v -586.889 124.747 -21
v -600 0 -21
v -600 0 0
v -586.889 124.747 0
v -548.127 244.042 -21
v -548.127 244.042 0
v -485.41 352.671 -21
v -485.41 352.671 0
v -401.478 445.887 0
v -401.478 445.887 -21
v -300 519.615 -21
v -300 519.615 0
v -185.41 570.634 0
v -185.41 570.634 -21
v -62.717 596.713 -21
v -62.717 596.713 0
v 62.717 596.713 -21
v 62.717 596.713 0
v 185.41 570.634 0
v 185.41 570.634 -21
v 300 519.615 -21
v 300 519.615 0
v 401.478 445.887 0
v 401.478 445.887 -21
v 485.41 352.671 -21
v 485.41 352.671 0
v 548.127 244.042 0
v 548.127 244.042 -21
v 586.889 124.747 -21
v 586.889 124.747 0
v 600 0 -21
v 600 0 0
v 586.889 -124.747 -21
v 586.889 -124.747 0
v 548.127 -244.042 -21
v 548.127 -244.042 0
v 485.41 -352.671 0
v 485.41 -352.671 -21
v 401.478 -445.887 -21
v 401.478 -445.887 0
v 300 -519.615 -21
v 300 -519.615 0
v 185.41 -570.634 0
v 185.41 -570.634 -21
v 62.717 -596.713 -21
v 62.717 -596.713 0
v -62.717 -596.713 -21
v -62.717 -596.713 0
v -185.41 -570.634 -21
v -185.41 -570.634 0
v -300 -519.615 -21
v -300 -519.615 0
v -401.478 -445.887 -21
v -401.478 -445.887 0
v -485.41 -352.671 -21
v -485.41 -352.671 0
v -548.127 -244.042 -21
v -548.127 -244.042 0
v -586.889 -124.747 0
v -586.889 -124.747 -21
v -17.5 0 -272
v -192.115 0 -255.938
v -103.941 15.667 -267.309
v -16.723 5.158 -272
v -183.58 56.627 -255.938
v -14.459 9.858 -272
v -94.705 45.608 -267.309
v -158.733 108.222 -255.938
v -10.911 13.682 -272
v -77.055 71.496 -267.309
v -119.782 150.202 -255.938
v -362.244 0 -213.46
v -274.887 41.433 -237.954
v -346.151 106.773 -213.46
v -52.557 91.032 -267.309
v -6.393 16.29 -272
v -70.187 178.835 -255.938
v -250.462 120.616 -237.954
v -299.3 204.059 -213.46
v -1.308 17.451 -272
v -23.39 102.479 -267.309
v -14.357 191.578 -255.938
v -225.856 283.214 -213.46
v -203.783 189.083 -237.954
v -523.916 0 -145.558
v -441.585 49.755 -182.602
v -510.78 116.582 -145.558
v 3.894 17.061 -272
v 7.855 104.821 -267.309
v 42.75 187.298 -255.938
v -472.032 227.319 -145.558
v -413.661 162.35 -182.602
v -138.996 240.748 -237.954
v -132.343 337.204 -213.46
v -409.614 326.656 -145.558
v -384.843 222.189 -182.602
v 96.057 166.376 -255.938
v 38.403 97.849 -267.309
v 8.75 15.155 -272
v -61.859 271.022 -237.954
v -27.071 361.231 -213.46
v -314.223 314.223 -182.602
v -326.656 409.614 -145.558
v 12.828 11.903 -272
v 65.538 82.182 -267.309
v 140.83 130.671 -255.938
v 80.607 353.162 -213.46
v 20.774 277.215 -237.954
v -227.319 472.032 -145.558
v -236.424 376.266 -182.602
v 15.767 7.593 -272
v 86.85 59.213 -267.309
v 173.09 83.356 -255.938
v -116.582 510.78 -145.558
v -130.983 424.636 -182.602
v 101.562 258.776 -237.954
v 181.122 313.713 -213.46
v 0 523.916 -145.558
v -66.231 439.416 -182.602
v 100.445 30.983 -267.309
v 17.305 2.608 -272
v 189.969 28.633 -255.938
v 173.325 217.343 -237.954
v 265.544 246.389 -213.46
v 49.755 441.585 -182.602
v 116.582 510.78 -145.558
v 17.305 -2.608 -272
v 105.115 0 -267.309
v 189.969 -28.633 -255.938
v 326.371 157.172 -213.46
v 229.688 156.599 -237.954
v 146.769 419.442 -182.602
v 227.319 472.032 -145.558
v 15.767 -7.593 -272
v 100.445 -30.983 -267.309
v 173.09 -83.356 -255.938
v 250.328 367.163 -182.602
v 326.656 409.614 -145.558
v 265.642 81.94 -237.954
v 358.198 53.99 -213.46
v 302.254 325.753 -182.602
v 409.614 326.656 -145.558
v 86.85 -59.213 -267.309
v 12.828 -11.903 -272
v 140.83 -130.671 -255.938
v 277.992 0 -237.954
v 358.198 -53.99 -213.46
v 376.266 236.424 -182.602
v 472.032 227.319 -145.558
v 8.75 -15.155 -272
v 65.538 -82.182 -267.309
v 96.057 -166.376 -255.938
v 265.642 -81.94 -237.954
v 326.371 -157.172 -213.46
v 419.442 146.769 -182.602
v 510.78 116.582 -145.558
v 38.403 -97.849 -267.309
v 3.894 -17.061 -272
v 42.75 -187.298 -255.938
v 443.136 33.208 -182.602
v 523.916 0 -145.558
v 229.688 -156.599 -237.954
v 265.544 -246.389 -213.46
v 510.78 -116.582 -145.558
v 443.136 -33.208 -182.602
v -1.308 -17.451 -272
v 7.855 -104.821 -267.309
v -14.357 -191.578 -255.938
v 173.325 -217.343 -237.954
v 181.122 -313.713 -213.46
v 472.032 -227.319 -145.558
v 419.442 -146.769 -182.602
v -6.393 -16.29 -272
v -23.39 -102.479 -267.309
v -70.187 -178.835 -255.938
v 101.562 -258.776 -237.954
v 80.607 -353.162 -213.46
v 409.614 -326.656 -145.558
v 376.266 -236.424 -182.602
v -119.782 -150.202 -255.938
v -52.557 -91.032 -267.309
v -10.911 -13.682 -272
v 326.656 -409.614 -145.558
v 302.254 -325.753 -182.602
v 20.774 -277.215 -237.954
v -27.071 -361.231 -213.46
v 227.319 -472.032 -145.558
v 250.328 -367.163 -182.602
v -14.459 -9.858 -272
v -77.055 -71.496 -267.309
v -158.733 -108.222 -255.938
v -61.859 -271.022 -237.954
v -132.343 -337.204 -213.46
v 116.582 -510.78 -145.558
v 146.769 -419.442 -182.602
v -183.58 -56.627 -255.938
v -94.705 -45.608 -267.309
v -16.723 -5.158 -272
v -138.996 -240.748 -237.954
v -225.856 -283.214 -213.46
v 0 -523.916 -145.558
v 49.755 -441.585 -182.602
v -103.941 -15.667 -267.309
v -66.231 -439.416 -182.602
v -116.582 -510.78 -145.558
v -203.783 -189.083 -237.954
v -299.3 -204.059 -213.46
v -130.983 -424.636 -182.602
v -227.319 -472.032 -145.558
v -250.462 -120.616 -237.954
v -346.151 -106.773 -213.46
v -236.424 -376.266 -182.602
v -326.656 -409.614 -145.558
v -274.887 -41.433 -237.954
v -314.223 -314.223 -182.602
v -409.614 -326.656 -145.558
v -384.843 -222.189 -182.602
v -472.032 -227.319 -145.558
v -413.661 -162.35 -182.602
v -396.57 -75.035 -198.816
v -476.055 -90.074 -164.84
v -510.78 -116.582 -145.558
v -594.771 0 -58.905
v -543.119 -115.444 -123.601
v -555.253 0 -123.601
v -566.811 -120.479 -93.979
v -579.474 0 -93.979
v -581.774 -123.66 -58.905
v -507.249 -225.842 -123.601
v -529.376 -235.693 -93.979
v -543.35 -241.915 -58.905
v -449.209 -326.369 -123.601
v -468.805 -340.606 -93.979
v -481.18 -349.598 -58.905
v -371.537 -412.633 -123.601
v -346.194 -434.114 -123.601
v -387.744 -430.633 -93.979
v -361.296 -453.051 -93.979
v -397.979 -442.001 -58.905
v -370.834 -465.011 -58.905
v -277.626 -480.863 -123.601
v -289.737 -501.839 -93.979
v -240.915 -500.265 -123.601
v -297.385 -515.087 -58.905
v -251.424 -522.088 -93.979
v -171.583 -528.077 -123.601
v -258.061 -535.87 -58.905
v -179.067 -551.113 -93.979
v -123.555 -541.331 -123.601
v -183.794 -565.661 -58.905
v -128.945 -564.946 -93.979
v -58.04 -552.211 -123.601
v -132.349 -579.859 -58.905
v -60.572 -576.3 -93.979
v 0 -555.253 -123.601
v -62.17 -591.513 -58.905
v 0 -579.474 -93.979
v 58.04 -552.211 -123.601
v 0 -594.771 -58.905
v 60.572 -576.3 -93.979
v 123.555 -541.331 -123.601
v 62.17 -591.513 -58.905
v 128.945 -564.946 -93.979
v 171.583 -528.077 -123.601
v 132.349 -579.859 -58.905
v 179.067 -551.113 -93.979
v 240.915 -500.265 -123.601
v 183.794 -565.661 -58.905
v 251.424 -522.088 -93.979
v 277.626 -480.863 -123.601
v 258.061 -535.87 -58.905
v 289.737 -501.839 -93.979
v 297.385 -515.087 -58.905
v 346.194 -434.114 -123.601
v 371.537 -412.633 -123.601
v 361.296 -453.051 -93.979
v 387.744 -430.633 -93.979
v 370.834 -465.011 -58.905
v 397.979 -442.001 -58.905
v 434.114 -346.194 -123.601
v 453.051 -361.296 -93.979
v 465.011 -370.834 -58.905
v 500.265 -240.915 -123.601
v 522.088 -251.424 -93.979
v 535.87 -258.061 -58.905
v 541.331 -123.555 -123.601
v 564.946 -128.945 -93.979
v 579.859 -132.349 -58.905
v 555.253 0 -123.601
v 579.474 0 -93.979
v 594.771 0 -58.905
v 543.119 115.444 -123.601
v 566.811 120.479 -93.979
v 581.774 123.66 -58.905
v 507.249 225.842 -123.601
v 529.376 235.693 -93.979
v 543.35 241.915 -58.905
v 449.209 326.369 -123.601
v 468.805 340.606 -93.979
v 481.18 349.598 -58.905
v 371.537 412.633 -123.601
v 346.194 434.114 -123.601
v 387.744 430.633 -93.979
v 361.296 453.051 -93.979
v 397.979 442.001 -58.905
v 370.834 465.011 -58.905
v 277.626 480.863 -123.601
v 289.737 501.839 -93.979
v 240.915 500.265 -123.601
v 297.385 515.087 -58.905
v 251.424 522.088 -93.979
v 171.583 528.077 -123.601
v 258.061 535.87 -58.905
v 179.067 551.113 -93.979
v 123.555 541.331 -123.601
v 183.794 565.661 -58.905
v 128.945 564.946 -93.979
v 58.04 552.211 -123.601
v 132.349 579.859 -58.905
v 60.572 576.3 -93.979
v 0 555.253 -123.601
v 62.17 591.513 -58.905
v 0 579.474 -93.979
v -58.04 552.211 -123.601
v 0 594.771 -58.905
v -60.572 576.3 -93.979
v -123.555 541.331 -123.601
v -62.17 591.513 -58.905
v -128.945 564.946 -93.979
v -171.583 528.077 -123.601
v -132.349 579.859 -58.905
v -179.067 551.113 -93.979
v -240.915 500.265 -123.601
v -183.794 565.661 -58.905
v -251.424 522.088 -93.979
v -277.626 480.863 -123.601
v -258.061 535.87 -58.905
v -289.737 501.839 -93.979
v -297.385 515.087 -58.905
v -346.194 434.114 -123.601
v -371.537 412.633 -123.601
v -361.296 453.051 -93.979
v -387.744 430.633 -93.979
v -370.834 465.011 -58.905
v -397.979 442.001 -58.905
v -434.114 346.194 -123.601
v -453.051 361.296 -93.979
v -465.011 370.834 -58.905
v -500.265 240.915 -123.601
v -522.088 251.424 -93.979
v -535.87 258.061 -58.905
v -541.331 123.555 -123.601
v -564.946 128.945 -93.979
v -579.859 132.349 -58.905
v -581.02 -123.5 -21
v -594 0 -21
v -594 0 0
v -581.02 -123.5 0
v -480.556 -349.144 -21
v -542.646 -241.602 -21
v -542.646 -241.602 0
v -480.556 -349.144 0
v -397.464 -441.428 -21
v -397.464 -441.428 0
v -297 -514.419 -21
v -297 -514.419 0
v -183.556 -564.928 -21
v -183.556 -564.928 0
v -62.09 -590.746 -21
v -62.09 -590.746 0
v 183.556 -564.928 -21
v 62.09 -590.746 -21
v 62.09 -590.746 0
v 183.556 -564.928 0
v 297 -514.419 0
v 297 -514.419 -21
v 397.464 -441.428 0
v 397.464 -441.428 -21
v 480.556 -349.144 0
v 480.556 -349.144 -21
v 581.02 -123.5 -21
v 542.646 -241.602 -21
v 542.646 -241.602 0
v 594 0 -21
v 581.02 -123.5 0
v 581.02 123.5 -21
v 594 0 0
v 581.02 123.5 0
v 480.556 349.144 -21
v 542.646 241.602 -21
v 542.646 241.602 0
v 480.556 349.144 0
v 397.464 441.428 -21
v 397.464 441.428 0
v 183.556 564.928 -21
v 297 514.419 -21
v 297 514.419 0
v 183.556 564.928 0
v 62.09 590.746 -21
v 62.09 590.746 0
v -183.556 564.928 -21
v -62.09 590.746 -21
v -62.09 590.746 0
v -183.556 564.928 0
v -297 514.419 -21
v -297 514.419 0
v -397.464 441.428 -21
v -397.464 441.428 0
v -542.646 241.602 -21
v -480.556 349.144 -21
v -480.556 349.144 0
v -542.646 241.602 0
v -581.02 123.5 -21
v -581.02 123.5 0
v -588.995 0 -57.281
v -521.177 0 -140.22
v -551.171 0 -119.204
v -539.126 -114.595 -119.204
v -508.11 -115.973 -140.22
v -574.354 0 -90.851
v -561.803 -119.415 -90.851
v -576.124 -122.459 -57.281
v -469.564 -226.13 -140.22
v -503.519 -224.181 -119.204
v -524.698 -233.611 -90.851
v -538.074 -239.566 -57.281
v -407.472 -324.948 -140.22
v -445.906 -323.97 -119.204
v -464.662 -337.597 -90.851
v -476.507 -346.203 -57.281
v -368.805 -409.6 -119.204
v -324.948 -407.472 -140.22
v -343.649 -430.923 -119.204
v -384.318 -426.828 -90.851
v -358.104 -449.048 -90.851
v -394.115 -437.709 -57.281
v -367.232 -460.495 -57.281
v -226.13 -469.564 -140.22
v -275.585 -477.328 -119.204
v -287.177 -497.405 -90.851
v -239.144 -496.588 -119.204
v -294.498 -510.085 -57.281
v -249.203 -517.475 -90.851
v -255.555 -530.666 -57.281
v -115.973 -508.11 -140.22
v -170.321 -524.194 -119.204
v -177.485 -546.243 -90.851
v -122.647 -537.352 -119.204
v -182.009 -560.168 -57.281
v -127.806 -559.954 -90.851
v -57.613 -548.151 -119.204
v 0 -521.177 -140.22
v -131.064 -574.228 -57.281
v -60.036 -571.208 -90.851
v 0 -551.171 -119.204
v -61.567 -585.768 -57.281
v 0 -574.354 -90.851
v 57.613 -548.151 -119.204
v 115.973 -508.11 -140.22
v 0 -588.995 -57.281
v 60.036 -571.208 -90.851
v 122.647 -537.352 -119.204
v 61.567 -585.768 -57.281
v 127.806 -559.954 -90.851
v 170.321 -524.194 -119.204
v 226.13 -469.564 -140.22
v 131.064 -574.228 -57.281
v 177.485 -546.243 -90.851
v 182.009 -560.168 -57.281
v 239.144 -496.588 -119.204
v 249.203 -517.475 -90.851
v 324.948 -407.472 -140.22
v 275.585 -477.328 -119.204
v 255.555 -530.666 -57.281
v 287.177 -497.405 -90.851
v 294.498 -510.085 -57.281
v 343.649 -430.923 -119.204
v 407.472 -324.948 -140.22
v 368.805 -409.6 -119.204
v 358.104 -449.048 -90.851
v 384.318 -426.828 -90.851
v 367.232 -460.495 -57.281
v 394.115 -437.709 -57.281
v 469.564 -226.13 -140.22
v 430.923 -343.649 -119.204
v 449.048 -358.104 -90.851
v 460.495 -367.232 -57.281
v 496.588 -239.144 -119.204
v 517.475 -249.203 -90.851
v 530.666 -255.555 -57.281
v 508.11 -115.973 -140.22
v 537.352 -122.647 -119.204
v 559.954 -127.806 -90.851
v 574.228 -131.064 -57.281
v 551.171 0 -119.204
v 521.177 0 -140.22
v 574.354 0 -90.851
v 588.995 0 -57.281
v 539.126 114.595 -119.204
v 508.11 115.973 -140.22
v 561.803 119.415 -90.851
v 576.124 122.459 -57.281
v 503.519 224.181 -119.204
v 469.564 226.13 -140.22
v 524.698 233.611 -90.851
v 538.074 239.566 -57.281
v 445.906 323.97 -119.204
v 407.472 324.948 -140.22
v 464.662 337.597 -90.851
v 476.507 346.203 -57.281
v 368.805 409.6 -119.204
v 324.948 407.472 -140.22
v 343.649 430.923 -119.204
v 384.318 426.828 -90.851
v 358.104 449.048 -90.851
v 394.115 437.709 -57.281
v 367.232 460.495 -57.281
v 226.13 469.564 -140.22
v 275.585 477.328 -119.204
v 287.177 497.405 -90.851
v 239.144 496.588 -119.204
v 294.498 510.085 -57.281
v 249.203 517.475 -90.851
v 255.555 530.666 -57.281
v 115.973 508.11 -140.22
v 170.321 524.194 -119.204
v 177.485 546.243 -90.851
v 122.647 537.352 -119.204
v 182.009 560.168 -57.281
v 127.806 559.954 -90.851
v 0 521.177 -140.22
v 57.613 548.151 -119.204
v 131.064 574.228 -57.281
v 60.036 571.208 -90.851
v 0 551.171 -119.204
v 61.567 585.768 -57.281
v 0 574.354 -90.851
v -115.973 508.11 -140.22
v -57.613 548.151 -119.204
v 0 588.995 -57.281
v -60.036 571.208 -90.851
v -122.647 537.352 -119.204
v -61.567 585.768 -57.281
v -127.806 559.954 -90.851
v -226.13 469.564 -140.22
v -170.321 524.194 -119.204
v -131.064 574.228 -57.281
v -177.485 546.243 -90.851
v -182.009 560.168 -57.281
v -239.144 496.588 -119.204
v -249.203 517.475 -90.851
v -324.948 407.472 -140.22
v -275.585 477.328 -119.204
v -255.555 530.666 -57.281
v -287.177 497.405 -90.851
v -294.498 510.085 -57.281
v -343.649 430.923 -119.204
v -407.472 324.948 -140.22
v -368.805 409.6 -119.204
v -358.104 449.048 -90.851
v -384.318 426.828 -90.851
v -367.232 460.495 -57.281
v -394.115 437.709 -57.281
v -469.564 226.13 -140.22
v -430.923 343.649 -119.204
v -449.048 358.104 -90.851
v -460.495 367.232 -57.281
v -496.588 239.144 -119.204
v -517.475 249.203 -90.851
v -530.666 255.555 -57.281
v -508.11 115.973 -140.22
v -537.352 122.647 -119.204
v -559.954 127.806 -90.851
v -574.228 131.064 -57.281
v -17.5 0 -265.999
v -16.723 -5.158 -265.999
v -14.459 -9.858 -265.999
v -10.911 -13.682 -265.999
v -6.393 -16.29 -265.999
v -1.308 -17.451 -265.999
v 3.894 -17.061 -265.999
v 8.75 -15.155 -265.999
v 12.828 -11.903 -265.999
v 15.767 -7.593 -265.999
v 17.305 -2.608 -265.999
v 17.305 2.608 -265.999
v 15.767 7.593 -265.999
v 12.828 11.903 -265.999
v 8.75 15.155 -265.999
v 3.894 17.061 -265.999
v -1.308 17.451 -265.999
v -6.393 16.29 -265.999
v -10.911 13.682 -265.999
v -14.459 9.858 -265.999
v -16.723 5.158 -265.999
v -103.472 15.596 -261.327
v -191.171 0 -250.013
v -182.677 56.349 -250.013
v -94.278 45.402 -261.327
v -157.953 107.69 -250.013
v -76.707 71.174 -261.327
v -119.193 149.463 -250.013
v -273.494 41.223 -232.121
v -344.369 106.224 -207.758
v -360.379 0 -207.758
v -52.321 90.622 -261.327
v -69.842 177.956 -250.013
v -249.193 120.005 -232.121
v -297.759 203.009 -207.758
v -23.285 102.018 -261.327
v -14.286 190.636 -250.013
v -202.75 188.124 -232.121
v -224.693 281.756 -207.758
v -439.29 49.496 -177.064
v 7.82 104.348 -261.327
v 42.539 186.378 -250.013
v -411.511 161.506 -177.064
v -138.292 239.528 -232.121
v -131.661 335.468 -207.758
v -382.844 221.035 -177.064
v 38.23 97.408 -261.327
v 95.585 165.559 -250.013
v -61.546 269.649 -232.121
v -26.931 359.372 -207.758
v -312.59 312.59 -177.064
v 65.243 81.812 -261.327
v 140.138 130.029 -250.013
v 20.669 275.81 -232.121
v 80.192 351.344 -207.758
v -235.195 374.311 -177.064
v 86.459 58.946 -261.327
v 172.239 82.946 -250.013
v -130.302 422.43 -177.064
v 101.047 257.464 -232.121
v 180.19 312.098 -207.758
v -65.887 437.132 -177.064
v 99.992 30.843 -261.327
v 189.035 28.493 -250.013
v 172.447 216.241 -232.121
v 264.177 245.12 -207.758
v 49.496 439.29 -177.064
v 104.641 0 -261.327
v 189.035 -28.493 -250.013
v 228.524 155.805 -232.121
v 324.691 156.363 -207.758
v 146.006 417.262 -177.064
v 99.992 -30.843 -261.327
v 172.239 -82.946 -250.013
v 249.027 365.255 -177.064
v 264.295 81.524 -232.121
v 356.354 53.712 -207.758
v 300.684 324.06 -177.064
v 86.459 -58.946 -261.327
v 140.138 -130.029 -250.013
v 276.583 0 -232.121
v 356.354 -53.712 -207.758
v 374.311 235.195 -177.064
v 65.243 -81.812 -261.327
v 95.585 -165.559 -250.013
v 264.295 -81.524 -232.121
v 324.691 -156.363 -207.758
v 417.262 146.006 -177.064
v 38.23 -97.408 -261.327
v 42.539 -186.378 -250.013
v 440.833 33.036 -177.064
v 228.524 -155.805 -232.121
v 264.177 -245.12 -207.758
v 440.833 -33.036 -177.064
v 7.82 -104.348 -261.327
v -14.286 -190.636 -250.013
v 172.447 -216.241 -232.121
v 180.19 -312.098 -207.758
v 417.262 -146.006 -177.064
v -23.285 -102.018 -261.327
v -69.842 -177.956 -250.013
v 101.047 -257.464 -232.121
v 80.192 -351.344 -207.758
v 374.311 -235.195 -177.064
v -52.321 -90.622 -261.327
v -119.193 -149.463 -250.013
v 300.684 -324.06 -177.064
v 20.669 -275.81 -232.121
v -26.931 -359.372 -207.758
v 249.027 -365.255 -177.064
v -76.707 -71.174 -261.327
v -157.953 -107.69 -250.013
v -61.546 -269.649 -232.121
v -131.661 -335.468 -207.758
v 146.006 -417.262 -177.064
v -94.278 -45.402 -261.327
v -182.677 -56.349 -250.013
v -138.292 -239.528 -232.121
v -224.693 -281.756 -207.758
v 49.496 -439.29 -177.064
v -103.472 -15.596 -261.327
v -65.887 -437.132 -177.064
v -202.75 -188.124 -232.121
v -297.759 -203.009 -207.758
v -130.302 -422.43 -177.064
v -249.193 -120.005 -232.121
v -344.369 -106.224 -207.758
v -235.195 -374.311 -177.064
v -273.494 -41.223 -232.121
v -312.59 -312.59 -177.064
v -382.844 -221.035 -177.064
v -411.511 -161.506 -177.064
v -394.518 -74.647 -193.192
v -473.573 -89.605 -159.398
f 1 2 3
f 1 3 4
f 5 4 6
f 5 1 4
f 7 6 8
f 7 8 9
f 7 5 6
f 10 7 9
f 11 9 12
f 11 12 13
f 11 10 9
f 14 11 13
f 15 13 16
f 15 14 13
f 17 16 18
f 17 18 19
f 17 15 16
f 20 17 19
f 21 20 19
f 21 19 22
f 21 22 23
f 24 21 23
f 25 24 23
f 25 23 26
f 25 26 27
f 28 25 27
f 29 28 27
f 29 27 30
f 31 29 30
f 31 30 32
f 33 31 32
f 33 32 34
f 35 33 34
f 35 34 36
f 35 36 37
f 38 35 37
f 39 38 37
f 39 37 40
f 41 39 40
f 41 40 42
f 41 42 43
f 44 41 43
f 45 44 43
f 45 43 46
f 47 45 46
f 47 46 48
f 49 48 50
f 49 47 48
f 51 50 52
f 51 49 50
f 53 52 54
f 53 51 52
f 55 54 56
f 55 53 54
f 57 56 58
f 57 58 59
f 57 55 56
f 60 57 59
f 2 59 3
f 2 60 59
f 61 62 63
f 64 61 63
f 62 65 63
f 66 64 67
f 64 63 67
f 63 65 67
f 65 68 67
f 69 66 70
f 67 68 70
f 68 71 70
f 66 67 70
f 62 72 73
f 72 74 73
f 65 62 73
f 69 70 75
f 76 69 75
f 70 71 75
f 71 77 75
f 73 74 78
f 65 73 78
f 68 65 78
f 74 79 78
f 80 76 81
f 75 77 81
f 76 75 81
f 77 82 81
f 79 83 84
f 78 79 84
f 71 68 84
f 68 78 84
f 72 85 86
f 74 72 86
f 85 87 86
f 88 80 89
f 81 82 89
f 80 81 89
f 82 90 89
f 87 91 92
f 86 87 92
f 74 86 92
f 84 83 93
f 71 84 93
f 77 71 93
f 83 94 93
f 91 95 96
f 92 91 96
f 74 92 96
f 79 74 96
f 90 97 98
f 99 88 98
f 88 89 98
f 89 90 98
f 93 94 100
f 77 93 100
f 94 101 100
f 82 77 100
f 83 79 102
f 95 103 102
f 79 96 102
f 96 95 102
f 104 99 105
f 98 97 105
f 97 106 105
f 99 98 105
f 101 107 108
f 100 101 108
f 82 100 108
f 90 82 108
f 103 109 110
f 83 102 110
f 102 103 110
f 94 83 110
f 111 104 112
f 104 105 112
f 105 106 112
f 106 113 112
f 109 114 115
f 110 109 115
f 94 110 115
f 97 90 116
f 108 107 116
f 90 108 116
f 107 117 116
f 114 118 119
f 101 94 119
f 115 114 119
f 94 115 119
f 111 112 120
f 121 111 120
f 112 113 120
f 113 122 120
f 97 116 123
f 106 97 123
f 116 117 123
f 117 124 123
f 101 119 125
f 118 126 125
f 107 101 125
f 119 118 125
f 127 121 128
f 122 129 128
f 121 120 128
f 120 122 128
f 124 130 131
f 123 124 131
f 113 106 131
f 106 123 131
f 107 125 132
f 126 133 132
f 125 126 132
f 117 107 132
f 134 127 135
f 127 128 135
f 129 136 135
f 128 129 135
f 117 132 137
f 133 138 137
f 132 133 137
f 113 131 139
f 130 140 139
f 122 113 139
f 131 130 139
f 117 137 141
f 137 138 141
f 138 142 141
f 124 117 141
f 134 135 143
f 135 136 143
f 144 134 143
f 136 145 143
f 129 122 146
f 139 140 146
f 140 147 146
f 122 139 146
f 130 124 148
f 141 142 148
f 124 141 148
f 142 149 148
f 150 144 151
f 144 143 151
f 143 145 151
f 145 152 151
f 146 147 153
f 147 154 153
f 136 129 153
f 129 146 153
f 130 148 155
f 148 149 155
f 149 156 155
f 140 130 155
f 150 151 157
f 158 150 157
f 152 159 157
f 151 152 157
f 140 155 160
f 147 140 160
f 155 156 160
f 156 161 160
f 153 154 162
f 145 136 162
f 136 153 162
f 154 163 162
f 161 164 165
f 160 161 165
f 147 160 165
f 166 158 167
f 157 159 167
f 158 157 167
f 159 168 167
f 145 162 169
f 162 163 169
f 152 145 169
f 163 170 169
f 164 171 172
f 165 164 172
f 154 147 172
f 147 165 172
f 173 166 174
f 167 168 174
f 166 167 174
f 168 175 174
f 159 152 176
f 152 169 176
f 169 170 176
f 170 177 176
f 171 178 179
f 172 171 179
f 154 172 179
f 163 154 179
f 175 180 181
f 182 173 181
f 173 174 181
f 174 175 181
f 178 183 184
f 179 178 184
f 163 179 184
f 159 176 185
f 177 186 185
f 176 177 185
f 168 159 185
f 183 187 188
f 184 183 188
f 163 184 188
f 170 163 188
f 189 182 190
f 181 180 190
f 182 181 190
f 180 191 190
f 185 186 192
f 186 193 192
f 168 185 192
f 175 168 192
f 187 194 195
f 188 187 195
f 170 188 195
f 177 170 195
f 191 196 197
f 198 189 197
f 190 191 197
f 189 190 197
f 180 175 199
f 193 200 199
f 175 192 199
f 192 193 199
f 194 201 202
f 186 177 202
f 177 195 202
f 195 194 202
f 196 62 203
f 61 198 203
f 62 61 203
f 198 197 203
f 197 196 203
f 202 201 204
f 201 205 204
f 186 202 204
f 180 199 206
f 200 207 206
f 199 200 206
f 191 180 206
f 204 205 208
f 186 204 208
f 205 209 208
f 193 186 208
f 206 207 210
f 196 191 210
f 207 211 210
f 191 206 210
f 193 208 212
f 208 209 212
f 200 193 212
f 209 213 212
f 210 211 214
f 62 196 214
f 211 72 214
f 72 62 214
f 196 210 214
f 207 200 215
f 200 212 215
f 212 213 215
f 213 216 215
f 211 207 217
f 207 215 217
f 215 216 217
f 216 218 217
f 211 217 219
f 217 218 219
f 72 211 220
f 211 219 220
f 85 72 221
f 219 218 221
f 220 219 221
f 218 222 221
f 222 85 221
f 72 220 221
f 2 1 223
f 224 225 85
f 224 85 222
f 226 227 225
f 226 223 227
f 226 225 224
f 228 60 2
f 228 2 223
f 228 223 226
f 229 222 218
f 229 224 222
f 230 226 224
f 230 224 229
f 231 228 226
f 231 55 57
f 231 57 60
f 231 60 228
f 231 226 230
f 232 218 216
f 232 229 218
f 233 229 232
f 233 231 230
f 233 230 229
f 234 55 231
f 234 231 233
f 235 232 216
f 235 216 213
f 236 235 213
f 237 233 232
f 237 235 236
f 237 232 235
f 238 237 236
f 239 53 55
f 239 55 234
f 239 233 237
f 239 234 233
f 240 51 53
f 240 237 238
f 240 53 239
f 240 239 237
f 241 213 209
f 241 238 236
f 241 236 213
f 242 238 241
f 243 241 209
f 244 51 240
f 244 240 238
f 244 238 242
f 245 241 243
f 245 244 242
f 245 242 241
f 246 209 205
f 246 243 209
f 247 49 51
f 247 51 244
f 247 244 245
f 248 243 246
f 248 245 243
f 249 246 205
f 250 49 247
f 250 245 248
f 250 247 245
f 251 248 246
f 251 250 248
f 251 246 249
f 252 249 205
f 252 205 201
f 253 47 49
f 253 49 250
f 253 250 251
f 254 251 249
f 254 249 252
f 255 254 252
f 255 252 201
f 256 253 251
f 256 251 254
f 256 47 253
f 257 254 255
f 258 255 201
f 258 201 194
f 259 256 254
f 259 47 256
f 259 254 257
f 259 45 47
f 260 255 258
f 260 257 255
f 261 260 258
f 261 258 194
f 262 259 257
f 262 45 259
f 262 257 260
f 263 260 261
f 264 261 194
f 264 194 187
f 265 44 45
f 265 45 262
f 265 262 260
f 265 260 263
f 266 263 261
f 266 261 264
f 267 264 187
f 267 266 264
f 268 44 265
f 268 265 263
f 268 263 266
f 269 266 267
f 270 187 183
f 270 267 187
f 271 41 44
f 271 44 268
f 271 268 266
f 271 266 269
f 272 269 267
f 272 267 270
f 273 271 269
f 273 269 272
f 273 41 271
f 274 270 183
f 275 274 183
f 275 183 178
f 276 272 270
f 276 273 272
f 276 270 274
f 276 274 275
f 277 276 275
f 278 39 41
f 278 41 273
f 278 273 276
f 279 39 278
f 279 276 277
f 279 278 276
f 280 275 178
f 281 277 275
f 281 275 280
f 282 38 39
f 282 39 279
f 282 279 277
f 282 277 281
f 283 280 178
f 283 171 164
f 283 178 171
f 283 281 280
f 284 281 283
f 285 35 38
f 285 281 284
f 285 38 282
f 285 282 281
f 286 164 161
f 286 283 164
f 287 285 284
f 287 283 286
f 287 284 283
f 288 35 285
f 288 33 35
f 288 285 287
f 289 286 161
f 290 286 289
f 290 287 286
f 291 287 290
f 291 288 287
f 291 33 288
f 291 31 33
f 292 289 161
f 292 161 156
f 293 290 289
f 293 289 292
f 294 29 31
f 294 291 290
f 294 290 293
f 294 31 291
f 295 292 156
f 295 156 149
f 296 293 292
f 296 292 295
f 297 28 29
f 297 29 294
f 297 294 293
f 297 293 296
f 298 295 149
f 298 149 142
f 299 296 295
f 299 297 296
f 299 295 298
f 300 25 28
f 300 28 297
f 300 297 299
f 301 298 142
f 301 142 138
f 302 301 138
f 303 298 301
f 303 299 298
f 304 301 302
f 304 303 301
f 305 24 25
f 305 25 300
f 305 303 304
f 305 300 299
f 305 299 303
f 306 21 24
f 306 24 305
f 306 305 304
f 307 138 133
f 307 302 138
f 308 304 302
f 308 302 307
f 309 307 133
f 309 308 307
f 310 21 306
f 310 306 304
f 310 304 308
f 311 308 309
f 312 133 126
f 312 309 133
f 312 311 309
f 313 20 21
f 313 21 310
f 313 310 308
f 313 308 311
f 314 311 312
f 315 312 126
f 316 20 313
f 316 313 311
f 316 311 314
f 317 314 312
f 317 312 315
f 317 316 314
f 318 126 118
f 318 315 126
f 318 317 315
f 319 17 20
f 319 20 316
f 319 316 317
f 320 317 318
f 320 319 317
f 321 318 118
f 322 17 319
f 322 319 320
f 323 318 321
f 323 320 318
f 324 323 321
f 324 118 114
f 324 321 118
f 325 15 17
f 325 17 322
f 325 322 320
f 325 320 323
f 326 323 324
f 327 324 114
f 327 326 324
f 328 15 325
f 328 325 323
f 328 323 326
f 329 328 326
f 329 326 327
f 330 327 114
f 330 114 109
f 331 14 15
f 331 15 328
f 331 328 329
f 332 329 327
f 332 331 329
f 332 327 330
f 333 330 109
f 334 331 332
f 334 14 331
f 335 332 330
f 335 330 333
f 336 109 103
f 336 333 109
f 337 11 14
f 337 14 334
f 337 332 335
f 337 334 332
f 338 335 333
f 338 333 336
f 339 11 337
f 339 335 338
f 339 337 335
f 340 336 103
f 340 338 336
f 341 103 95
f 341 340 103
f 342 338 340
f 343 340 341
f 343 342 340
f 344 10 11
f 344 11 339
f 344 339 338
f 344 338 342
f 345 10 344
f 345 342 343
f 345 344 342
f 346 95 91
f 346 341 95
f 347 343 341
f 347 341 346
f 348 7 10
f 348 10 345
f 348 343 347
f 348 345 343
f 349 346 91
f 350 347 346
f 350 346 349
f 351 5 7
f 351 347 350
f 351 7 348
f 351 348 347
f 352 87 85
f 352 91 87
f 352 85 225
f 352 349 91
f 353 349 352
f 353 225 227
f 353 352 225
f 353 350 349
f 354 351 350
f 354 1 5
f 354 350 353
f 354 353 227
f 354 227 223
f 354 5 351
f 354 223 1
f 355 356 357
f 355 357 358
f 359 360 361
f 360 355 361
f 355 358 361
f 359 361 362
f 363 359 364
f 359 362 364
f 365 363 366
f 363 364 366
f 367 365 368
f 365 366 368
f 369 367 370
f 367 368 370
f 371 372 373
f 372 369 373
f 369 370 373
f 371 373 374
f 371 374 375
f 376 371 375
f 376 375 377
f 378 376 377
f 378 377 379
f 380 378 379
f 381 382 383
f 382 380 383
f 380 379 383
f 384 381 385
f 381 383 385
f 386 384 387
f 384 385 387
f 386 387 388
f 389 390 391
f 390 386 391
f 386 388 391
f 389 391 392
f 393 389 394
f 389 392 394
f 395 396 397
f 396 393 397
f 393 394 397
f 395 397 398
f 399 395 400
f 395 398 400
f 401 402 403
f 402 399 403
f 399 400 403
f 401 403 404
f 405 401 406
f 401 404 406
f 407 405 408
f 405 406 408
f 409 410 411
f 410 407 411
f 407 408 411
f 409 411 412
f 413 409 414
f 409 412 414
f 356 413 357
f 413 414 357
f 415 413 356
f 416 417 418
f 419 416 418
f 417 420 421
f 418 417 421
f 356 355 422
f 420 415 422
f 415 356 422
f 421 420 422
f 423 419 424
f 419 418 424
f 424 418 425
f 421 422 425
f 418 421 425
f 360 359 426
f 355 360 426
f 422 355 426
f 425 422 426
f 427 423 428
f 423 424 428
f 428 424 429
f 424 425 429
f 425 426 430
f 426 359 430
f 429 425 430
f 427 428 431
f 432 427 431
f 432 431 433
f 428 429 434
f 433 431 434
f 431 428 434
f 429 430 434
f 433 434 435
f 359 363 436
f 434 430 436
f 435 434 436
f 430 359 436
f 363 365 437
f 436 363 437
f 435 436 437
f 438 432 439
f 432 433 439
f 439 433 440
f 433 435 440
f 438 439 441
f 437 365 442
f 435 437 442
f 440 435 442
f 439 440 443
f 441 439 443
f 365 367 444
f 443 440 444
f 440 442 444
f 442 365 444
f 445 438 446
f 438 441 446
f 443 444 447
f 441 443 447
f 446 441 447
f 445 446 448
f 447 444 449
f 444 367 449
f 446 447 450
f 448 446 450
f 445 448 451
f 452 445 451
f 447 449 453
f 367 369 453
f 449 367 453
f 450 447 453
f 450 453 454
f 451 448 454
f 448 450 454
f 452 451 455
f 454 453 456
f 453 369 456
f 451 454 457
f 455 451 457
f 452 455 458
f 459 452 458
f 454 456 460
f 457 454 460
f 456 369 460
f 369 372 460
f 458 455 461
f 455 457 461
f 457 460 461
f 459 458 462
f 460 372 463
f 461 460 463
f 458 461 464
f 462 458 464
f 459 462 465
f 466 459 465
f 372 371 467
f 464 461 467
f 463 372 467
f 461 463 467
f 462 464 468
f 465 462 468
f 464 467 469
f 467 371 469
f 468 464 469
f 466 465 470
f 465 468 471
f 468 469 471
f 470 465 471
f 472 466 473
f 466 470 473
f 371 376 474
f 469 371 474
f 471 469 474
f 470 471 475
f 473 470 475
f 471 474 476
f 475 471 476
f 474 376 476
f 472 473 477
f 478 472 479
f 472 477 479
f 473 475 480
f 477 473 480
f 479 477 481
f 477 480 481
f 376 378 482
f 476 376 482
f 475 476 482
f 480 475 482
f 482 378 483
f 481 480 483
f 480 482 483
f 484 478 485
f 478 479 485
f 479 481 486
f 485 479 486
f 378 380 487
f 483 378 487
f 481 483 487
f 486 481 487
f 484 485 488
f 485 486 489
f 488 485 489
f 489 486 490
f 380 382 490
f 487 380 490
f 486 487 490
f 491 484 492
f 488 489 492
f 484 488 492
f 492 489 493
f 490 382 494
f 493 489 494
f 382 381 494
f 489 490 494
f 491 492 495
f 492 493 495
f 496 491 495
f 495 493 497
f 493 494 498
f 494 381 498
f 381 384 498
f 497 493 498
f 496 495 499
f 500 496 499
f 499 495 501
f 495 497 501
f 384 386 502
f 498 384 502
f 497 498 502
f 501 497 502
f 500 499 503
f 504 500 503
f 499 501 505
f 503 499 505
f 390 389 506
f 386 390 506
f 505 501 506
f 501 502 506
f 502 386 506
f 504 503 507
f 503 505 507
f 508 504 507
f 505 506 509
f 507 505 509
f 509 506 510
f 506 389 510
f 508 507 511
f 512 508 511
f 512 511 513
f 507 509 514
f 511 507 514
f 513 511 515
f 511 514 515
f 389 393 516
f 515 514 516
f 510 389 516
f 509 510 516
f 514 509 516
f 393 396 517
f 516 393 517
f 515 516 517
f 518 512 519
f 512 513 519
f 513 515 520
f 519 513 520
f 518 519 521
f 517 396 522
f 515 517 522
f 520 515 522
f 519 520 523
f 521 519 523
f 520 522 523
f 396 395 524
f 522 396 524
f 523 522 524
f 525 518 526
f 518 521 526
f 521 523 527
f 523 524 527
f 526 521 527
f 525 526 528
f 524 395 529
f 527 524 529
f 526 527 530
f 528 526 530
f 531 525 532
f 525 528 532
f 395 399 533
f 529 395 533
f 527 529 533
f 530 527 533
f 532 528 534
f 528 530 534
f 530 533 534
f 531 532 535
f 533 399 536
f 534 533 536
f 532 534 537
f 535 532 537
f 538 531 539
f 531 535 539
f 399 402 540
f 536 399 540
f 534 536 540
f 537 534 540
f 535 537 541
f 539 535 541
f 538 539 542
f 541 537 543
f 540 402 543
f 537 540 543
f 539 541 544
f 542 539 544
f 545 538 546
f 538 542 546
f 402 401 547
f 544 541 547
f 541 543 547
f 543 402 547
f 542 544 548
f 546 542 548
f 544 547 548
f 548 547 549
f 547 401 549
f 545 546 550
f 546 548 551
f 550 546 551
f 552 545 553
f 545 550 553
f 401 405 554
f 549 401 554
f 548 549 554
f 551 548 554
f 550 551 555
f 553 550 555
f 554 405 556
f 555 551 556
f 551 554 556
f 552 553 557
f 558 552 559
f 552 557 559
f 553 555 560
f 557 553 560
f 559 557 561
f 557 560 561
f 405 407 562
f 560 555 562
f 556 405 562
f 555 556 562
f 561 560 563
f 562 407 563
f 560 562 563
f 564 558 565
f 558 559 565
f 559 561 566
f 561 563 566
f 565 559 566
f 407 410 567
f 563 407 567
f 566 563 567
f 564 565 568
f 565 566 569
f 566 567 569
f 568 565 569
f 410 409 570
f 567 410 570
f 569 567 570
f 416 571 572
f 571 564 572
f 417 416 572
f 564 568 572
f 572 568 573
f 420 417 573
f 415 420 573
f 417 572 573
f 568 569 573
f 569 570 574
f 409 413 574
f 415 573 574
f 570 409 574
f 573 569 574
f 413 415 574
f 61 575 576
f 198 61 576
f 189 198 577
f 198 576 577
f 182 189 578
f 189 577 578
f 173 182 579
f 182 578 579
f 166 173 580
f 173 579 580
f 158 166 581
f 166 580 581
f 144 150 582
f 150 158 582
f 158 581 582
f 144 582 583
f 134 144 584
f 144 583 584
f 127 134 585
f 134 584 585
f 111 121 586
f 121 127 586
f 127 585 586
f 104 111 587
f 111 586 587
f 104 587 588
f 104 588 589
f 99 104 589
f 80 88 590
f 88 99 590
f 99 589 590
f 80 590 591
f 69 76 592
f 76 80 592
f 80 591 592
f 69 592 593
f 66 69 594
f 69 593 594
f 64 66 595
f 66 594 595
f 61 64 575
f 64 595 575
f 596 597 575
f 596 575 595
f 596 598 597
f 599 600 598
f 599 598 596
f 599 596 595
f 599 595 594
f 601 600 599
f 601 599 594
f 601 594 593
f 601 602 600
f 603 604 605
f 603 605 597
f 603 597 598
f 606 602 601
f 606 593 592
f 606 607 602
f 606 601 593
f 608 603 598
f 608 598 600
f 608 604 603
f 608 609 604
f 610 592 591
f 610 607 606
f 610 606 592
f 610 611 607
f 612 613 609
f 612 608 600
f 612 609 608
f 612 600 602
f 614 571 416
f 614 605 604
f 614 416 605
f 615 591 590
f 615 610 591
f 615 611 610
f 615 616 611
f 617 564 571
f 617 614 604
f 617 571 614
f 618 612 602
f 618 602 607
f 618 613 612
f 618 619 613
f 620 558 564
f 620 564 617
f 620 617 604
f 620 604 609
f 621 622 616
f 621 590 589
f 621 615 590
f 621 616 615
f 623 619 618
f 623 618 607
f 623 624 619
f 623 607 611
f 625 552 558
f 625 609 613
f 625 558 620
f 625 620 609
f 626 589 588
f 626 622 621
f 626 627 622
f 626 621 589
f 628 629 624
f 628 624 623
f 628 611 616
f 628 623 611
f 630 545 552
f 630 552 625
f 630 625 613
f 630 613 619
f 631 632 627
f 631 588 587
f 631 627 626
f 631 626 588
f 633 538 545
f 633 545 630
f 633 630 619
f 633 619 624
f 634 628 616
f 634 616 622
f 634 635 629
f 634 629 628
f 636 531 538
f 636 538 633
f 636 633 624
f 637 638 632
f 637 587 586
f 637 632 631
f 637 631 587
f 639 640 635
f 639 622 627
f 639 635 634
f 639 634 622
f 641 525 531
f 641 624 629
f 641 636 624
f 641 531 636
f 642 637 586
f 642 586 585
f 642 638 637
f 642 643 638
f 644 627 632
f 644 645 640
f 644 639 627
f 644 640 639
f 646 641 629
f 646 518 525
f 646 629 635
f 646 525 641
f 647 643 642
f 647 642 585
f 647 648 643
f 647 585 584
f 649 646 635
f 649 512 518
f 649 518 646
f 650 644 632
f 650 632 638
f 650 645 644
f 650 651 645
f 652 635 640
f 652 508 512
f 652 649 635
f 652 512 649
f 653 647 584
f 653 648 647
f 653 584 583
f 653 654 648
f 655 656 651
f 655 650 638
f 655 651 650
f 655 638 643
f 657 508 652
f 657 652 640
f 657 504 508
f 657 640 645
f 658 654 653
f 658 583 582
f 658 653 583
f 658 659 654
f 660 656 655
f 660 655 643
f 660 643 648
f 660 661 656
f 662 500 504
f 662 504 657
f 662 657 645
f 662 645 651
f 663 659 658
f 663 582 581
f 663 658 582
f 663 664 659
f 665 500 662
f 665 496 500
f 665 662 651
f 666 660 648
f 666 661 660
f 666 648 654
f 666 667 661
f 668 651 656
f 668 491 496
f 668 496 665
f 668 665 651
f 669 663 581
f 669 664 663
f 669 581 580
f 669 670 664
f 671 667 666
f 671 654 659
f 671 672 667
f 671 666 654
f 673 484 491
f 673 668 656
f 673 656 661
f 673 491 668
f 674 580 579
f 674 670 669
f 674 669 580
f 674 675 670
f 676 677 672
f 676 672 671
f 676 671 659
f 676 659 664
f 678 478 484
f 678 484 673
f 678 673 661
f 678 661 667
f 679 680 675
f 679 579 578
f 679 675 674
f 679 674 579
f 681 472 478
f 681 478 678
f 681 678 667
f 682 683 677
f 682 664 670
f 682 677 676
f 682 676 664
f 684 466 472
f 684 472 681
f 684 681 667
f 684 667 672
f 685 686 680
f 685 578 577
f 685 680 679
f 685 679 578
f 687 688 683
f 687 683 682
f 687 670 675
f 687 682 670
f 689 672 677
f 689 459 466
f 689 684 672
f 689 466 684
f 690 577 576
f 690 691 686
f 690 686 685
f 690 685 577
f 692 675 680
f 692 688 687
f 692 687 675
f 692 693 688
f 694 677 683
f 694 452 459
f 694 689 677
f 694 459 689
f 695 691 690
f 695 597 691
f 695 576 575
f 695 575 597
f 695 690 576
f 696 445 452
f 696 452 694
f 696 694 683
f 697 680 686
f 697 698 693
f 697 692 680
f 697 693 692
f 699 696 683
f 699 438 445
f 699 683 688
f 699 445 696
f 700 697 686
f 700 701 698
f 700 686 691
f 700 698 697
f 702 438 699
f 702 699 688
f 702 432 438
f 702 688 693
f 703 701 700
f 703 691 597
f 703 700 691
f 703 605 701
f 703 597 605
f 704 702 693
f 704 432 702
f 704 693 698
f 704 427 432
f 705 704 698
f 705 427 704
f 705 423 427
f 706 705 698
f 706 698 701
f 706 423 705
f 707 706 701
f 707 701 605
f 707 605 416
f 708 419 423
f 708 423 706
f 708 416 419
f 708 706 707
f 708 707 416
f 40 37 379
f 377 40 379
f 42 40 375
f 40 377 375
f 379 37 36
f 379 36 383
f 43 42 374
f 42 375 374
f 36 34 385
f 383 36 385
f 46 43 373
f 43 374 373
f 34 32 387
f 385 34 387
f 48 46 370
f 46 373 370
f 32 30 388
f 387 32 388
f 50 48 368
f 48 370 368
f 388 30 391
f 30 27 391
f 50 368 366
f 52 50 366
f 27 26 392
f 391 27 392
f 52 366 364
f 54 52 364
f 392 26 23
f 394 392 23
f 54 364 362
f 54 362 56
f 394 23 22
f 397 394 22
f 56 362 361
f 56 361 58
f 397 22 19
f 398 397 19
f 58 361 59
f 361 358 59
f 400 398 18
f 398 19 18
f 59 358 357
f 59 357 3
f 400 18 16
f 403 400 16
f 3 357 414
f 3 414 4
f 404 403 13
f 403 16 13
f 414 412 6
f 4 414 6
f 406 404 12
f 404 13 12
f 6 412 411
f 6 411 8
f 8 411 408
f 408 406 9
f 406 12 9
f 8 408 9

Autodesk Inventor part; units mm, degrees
ref_plane "YZ Plane" through (0, 0, 0) normal (1, 0, 0) x (0, 1, 0)
ref_plane "XZ Plane" through (0, 0, 0) normal (0, 1, 0) x (-1, 0, 0)
ref_plane "XY Plane" through (0, 0, 0) normal (0, 0, 1) x (1, 0, 0)
sketch "Sketch1" plane through (0, 0, 0) normal (0, 1, 0) x (-1, 0, 0)
  line L0 (600, 0) -> (600, -21)
  arc A0 (523.9158, -145.5583) -> (600, -21) centre (460, -21) ccw
  arc A1 (17.5, -272) -> (523.9158, -145.5583) centre (0, 875.442) ccw
  line L1 (0, 272) -> (0, -272)
  arc A2 (17.5, -265.9993) -> (521.1766, -140.2201) centre (0, 875.442) ccw
  arc A3 (521.1766, -140.2201) -> (594, -21) centre (460, -21) ccw
  line L2 (594, -21) -> (594, 0)
  line L3 (594, 0) -> (600, 0)
  line L4 (0, -272) -> (17.5, -272)
  line L5 (0, -265.9993) -> (17.5, -265.9993)
  line L6 (17.5, -272) -> (17.5, -265.9993)
  point P0 (0, 0)
  point P1 (0, 0)
  point P2 (0, -163.7009)
  point P3 (0, -169.7009)
  dimension "d0" = 140
  dimension "d1" = 21
  dimension "d3" = 1147.5754
  dimension "d6" = 6
  dimension "d13" = 35
  dimension "d14" = 1200
  dimension "d15" = 272
revolve "Revolution1" add sketch "Sketch1" angle 360 about axis through (0, 0, 272) along (0, 0, -1) contours L0 A0 A1 L6 A2 A3 L2 L3
equation "\"d0\" = tech_dishhead_small_rad"
equation "\"d1\" = tech_dishhead_edge_hight"
equation "\"d13\" = tech_dishhead_bottom_hole"
equation "\"d14\" = MAIN_filter_diam"
equation "\"d15\" = MAIN_dished_head_hight"
equation "\"tech_dishhead_small_rad\" = 140"
equation "\"tech_dishhead_edge_hight\" = 21"
equation "\"tech_dishhead_bottom_hole\" = 35"
equation "\"MAIN_filter_diam\" = 1200"
equation "\"MAIN_dished_head_hight\" = 272"
properties part number "TZS 1208 dished head" material "Steel"
